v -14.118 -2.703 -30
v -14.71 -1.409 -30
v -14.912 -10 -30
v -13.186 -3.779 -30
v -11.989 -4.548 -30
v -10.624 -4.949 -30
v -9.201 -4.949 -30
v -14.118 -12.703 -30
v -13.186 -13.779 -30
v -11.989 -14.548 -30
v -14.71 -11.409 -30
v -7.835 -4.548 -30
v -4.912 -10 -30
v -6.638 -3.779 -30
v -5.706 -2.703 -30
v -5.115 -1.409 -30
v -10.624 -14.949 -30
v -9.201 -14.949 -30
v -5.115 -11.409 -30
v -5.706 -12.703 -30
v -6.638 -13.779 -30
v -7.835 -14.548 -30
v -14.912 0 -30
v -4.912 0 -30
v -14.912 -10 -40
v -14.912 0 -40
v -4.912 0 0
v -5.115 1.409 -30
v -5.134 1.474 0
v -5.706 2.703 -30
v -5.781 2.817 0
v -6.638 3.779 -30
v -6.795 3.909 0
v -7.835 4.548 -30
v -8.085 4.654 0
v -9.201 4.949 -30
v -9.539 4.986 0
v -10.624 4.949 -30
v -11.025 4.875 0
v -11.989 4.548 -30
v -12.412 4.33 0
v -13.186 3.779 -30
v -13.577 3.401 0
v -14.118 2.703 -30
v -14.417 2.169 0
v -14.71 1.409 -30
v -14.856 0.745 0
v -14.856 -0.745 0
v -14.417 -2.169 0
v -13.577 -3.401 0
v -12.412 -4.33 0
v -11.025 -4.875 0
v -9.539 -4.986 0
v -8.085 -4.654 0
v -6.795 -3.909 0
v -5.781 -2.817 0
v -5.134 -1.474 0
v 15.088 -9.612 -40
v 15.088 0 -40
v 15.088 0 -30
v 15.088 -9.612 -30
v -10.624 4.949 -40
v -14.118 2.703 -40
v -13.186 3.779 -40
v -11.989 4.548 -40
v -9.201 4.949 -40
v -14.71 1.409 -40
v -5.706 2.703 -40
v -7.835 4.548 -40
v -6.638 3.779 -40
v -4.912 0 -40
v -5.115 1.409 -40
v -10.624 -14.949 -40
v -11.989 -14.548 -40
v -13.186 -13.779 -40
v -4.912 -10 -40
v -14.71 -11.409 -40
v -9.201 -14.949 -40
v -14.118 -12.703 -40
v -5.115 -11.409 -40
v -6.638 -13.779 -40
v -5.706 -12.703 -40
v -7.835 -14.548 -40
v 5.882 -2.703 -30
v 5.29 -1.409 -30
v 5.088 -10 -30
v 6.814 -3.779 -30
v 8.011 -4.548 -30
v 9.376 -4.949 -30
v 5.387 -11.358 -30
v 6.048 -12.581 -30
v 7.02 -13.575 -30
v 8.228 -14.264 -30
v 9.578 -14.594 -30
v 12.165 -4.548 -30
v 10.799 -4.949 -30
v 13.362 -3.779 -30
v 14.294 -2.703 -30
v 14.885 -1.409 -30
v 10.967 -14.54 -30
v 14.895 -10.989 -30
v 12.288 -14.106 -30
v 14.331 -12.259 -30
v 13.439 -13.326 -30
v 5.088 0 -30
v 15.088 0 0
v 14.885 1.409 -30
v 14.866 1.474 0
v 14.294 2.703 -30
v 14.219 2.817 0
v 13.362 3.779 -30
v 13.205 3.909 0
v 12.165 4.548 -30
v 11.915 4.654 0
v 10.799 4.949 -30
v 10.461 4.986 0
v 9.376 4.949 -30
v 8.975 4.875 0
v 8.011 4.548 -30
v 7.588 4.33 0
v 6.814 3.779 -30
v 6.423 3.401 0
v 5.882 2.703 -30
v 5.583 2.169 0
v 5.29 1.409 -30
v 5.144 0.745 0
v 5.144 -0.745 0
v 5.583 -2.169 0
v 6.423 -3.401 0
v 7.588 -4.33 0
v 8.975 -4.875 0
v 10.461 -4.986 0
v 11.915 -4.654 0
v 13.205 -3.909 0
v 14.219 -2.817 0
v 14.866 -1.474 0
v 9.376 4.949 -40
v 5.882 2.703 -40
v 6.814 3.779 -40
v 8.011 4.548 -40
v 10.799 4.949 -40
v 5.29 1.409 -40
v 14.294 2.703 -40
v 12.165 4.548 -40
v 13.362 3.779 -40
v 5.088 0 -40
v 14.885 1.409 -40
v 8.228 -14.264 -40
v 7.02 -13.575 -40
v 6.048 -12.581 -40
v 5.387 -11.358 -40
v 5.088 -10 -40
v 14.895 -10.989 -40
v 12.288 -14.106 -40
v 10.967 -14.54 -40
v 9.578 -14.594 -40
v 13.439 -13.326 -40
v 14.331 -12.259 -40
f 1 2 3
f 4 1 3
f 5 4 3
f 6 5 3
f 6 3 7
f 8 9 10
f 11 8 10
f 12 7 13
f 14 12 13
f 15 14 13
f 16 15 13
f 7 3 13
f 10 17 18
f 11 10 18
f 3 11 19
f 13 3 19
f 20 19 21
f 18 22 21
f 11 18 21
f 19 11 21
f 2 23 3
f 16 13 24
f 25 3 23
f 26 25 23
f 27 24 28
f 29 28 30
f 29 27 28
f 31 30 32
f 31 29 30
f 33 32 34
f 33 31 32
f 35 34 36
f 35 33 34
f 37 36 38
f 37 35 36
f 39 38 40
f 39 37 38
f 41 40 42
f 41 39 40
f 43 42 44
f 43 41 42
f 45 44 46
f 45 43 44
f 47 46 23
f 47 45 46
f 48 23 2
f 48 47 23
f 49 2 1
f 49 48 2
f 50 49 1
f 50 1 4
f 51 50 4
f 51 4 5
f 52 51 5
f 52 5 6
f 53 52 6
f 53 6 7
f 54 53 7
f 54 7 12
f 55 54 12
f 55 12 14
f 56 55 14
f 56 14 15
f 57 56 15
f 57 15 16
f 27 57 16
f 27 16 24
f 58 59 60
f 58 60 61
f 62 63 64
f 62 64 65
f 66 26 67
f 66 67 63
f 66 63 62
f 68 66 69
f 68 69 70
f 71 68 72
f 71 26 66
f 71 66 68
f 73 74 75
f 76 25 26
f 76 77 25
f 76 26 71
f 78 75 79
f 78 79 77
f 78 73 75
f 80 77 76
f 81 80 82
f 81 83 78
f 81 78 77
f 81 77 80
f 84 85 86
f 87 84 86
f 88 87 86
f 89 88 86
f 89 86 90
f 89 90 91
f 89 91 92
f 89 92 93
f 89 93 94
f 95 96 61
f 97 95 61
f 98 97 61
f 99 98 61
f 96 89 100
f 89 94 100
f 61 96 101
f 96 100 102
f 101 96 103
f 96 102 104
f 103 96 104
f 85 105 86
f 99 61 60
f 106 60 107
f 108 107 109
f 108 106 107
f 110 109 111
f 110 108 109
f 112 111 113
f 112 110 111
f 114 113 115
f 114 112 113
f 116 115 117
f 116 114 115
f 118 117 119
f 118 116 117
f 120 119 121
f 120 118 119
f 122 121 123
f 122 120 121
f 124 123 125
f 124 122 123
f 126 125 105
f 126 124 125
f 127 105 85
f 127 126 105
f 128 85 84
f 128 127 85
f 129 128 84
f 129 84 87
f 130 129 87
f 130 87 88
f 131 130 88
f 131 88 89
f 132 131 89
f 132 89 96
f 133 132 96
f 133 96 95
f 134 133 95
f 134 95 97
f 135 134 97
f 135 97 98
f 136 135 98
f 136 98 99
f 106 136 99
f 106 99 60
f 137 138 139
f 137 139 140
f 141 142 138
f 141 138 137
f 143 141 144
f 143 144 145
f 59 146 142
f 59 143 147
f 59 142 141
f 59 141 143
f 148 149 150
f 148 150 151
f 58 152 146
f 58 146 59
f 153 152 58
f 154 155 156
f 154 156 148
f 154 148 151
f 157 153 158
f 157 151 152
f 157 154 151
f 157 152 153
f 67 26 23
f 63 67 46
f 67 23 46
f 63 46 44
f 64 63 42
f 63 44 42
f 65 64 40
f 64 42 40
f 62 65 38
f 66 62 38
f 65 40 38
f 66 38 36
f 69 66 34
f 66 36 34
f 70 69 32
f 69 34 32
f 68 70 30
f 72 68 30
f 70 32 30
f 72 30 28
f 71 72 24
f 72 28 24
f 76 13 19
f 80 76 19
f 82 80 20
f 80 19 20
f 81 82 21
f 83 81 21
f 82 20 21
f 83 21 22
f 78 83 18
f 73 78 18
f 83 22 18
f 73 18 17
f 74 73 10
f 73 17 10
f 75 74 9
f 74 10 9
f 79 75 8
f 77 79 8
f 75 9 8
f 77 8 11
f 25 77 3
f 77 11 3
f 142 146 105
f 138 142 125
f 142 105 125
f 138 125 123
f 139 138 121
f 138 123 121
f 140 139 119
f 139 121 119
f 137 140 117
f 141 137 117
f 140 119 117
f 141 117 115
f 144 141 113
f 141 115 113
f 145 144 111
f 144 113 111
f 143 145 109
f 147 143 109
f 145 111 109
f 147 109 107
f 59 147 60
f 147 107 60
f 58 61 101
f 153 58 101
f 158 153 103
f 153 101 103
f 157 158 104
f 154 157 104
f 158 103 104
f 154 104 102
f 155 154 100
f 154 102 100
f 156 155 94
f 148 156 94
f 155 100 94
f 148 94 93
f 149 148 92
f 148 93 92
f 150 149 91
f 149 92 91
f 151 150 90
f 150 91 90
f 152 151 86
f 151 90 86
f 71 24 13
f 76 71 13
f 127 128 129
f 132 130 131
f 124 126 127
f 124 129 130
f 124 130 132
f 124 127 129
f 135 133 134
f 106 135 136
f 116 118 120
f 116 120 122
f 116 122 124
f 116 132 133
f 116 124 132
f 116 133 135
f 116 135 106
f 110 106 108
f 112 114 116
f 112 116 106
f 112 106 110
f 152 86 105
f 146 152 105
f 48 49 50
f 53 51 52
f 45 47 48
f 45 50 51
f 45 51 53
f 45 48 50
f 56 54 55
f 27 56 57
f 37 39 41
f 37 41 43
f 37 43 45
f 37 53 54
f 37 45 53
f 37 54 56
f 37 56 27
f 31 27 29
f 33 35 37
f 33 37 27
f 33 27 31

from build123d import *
from build123d import SkipClean  # not in build123d's __all__

# Parameters (mm, degrees)
F0_R     = 5
F1_DEPTH = 30
F3_DEPTH = 10
F5_DEPTH = 10


with BuildPart() as f1:
    # F0 (on Top) → F1 (new body)
    with BuildSketch(Plane.XY):
        with Locations((10.087849088, 0)):
            Circle(F0_R)
    extrude(amount=-F1_DEPTH)

    # F4 (on face) → F5 (join)
    with BuildSketch(Plane(origin=(0, 0, -30), x_dir=(1, 0, 0), z_dir=(0, 0, -1))):
        with BuildLine():
            Line((5.087849088, 10), (5.087849088, 0))
            ThreePointArc((5.087849088, 0), (10.087849088, -5), (15.087849088, 0))
            Line((15.087849088, 0), (15.087849088, 9.61173255))
            ThreePointArc((15.087849088, 9.61173255), (10.2745915071, 14.615499921), (5.087849088, 10))
        make_face()
    with SkipClean():  # cleaning this boolean's faces spoils the solid; the shape is the same uncleaned
        extrude(amount=F5_DEPTH)


with BuildPart() as f1b:
    # F0 (on Top) → F1, piece 2 (new body)
    with BuildSketch(Plane.XY):
        with Locations((-9.912150912, 0)):
            Circle(F0_R)
    extrude(amount=-F1_DEPTH)

    # F2 (on face) → F3 (join)
    with BuildSketch(Plane(origin=(0, 0, -30), x_dir=(1, 0, 0), z_dir=(0, 0, -1))):
        with BuildLine():
            Line((-14.912150912, 10), (-14.912150912, 0))
            ThreePointArc((-14.912150912, 0), (-9.912150912, -5), (-4.912150912, 0))
            Line((-4.912150912, 0), (-4.912150912, 10))
            ThreePointArc((-4.912150912, 10), (-9.912150912, 15), (-14.912150912, 10))
        make_face()
    with SkipClean():  # cleaning this boolean's faces spoils the solid; the shape is the same uncleaned
        extrude(amount=F3_DEPTH)


solid = Compound([f1.part, f1b.part])
